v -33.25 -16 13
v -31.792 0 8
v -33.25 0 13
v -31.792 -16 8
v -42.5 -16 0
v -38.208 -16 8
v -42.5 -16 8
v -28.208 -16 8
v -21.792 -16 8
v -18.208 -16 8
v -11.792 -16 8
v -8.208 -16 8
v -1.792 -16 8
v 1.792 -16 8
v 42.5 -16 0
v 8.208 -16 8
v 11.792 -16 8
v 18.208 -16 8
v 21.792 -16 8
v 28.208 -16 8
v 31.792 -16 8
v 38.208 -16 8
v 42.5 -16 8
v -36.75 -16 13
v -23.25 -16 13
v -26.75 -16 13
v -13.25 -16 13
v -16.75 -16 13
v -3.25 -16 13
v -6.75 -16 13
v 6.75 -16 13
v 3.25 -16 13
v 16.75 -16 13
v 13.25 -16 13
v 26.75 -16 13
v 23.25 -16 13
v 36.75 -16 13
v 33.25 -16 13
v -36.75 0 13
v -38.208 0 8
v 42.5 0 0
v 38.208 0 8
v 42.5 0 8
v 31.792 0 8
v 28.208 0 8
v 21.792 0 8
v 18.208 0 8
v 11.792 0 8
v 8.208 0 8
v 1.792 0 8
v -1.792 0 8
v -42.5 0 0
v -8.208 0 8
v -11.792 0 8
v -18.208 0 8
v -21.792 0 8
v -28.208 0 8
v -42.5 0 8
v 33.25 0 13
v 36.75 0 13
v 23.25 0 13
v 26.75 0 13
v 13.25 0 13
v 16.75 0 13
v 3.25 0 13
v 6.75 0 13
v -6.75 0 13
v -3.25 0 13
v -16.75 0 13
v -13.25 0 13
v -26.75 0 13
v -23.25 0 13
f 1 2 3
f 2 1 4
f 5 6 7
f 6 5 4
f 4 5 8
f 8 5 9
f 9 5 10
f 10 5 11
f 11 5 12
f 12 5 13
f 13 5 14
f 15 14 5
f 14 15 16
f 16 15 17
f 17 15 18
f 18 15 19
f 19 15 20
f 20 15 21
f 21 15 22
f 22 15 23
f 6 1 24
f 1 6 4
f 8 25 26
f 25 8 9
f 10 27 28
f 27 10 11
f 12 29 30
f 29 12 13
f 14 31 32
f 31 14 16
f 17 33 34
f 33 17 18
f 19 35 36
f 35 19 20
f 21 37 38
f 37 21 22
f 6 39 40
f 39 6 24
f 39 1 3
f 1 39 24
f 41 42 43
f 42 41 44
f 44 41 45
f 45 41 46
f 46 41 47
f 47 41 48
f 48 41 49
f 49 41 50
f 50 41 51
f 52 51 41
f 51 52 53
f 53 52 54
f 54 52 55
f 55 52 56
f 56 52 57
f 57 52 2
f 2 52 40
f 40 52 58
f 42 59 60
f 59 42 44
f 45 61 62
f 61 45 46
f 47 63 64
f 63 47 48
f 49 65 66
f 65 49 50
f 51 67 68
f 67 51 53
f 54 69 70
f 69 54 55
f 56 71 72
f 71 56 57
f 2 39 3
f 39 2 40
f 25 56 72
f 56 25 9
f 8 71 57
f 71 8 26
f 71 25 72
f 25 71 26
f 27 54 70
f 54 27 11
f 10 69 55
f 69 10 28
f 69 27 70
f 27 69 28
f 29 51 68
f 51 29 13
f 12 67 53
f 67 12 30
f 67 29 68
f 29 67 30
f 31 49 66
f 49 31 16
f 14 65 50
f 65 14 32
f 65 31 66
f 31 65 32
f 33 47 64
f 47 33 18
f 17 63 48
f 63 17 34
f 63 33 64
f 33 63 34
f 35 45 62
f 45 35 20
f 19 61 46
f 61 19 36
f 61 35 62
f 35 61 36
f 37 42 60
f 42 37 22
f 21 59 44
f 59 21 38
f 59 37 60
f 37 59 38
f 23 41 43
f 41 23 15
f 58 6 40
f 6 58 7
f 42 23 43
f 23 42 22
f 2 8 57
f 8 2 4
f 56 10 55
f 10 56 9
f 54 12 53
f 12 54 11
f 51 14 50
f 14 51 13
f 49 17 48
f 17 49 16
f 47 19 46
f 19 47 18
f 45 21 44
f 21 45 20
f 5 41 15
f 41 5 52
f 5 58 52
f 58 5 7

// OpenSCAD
$fn = 32;

// ----------------------------------------------------------------------
// Toothed rack, 8 teeth
// 10 mm pitch, 5 mm teeth
// ----------------------------------------------------------------------

// --- parameters (mm) ---
bar_w = 16;     // bar width (Y)
bar_h = 8;      // bar height (Z)
teeth = 8;      // number of teeth
pitch = 10;     // tooth pitch
tooth_h = 5;    // tooth height above the bar
root_w = 7;     // tooth width at the root
crest_w = 3.5;  // tooth width at the crest

// --- derived feature positions (mm) ---
span = (teeth - 1) * pitch;  // = 70   distance between the outer teeth
bar_l = span + root_w + 8;   // = 85   bar length: teeth plus 4 mm at each end
tooth_x = -span / 2;         // = -35   X of the first tooth
height = bar_h + tooth_h;    // = 13   overall height
feature_centers = [
  [tooth_x + 0 * pitch, -bar_w / 2],
  [tooth_x + 1 * pitch, -bar_w / 2],
  [tooth_x + 2 * pitch, -bar_w / 2],
  [tooth_x + 3 * pitch, -bar_w / 2],
  [tooth_x + 4 * pitch, -bar_w / 2],
  [tooth_x + 5 * pitch, -bar_w / 2],
  [tooth_x + 6 * pitch, -bar_w / 2],
  [tooth_x + 7 * pitch, -bar_w / 2]
];   // tooth centre line, drives the tooth loop

// bar with a rack of teeth, one extruded trapezoium per centre
module rack_tooth() {
  linear_extrude(height = bar_w)
    polygon(points = [
      [0, 0],
      [root_w, 0],
      [root_w / 2 + crest_w / 2, tooth_h + 1],
      [root_w / 2 - crest_w / 2, tooth_h + 1]
    ]);
}

union() {
  translate([-bar_l / 2, -bar_w, 0]) cube([bar_l, bar_w, bar_h]);
  for (centre = feature_centers)
    translate([centre[0] - root_w / 2, 0, bar_h - 1]) rotate([90, 0, 0]) rack_tooth();
}
